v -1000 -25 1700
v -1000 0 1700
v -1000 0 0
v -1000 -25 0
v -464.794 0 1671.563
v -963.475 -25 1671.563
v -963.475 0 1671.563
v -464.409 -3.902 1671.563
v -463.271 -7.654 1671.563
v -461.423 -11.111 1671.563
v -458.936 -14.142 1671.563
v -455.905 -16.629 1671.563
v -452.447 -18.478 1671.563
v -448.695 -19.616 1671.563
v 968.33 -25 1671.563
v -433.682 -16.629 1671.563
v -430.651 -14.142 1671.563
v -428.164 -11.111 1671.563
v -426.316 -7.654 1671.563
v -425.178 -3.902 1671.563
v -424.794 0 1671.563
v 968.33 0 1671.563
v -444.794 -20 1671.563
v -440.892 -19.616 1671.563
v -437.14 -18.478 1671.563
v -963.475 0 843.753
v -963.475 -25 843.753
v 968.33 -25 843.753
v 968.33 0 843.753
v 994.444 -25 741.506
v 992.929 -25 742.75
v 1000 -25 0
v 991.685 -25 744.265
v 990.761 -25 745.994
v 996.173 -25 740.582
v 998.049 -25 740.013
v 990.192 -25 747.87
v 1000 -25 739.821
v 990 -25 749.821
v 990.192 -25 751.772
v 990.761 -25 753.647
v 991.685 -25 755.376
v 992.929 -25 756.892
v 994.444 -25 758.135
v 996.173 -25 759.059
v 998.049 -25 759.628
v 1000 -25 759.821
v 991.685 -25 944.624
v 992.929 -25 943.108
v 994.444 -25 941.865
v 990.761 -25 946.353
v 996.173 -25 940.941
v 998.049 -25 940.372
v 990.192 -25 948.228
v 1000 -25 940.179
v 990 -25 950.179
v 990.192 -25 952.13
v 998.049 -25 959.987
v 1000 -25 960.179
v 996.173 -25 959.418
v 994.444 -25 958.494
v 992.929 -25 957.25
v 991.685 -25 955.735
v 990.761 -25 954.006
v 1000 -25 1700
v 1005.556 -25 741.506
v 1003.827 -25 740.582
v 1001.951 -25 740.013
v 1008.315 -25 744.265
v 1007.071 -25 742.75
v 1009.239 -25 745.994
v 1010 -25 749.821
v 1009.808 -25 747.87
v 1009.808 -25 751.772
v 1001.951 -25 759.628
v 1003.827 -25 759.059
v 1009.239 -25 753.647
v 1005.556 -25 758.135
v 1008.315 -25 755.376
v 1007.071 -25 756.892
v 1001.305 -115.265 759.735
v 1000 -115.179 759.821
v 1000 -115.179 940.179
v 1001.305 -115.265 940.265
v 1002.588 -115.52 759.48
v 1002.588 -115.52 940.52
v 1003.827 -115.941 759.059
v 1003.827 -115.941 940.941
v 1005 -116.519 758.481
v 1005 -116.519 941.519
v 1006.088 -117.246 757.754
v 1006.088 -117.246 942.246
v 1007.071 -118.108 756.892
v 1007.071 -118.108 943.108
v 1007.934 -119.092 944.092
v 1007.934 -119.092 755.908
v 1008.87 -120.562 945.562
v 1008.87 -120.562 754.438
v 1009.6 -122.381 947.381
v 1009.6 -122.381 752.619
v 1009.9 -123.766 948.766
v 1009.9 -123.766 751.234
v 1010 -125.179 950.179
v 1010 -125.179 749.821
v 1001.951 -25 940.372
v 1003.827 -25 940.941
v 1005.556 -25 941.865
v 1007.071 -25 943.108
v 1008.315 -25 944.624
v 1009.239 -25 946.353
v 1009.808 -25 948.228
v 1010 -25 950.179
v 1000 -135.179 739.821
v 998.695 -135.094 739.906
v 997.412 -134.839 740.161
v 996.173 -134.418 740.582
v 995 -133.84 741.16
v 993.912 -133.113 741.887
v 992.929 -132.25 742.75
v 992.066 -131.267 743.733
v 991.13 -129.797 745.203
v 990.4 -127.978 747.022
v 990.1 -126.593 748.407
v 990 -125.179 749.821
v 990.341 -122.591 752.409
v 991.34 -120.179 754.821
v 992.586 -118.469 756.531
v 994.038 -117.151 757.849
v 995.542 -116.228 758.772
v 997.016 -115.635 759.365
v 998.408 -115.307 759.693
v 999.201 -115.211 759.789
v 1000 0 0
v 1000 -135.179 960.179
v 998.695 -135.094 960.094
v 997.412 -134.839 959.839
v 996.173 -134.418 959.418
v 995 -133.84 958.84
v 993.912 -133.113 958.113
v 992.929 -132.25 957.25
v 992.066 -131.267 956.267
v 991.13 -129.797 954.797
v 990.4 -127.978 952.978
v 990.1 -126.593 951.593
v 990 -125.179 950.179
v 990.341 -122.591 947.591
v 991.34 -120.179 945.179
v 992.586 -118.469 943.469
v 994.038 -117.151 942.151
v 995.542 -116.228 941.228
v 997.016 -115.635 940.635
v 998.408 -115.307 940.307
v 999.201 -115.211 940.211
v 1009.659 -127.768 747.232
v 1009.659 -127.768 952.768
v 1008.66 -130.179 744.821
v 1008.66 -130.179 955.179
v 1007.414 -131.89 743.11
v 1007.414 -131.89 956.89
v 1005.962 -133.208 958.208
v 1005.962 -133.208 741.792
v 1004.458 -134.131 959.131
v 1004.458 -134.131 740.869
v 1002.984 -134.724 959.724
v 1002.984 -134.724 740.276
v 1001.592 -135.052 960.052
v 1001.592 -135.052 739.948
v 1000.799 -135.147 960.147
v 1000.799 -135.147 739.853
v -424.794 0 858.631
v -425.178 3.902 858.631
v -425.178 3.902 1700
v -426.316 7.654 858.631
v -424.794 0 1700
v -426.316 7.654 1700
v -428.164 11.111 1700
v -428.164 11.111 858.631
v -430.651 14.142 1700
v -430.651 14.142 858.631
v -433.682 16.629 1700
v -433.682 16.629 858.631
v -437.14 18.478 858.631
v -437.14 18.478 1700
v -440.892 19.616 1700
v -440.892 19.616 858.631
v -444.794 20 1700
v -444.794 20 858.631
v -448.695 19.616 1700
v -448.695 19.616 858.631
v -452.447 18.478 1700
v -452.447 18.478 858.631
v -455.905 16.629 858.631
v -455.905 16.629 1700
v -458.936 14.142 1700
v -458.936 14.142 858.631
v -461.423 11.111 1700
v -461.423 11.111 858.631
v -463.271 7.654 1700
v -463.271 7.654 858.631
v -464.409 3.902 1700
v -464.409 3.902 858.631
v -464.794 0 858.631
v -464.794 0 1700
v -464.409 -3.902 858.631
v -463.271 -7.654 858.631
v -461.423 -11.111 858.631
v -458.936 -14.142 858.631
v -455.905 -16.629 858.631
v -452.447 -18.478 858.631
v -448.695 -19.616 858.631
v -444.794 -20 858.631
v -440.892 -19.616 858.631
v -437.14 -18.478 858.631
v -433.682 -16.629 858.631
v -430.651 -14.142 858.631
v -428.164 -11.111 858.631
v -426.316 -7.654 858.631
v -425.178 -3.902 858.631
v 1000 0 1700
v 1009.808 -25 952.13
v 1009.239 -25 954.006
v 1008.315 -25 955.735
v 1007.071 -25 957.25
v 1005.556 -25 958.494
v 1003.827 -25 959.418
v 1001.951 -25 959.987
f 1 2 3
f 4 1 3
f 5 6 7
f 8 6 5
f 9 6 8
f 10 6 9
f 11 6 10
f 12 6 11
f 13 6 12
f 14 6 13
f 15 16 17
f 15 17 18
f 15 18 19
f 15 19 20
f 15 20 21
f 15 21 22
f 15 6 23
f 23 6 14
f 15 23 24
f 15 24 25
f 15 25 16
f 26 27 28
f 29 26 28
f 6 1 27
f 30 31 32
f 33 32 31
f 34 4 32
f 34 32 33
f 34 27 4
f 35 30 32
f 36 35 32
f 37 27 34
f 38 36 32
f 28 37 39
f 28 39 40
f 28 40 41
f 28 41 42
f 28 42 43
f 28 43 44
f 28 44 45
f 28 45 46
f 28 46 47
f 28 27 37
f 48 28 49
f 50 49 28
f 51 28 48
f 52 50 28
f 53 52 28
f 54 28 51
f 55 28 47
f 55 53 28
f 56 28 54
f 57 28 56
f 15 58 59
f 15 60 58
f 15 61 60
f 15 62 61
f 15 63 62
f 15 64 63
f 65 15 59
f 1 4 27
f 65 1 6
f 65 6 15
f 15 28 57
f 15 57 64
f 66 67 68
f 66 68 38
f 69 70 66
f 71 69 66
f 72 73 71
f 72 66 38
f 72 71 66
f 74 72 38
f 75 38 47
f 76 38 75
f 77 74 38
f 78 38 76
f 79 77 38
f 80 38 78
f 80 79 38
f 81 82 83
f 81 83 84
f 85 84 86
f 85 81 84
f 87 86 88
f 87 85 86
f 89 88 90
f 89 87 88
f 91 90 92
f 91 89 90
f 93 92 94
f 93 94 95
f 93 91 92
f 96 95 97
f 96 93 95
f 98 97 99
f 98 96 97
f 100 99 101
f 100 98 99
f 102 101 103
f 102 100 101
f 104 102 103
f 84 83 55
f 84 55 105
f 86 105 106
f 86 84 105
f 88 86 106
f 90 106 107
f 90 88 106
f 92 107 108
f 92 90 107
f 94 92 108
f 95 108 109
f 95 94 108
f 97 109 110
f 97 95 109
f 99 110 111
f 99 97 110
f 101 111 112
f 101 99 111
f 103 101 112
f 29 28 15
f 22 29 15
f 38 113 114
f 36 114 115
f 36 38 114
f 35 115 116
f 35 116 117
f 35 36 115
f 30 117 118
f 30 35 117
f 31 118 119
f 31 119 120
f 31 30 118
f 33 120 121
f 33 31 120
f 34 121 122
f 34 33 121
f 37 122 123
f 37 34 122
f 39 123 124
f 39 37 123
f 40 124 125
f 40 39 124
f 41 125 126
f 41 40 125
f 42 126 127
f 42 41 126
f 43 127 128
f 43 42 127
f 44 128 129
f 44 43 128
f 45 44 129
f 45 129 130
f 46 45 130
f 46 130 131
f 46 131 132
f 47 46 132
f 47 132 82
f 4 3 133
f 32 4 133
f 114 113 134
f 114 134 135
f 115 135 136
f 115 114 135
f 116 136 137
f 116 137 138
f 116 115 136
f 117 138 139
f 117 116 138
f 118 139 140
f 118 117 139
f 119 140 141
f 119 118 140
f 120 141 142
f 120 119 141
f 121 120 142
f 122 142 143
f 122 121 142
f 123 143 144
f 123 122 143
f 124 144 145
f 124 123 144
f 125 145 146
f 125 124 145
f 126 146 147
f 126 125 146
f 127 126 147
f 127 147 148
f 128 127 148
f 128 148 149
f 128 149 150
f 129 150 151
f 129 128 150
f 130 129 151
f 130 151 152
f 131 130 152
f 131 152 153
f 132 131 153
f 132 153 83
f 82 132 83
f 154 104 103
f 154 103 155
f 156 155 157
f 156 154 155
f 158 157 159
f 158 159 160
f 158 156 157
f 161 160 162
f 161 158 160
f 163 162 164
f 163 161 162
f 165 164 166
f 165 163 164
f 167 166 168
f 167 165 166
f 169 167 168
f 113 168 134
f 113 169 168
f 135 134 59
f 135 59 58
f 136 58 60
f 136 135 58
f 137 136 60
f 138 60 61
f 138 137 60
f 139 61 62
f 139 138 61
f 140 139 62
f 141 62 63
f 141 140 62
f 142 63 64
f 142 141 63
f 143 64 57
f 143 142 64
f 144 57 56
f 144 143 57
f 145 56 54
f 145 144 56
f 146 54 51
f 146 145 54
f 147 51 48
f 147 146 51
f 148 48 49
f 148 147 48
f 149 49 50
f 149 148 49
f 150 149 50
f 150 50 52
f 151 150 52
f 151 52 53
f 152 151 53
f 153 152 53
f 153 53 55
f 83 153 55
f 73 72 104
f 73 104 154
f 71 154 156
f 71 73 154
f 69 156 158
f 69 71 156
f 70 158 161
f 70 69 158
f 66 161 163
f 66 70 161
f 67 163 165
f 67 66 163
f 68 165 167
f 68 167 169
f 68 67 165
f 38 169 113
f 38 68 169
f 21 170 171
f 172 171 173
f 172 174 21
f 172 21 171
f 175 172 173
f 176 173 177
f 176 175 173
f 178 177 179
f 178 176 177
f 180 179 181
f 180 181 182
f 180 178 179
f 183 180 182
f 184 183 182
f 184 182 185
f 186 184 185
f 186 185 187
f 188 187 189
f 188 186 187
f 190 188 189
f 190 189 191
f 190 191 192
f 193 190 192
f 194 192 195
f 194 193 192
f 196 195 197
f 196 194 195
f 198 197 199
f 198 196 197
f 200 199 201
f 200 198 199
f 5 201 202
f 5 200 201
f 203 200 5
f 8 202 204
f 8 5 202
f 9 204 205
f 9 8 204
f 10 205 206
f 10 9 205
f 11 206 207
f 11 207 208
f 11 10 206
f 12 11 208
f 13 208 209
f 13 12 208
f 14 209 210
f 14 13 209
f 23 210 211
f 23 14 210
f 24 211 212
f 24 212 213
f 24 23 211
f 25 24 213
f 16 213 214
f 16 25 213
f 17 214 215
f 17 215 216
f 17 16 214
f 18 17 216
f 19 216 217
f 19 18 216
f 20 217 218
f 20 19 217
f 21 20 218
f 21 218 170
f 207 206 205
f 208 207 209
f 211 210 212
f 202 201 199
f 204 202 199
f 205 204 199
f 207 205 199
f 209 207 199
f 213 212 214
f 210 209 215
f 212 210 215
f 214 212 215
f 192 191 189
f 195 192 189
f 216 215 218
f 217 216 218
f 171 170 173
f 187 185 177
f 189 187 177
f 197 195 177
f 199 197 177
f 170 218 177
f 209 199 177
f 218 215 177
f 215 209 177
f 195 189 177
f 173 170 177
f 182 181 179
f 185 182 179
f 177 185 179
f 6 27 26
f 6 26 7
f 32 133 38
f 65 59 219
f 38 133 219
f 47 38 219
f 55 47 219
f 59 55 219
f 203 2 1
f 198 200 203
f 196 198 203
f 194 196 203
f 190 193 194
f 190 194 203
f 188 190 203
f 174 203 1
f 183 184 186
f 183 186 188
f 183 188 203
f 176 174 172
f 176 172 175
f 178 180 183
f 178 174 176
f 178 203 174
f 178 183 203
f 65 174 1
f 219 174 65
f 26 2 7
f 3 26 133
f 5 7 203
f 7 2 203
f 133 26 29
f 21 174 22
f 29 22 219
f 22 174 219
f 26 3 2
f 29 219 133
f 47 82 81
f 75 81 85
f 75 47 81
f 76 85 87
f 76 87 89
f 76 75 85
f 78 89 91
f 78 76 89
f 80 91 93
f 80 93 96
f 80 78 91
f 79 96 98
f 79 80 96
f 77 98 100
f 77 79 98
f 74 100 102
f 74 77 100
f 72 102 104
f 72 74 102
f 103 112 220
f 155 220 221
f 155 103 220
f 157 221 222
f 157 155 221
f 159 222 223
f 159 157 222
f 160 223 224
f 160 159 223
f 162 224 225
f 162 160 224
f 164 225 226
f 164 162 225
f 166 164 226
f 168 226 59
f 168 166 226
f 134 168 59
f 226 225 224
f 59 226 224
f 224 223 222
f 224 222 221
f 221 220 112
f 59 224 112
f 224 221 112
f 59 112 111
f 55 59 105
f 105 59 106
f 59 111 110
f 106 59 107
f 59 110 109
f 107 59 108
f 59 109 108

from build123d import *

# Parameters (mm, degrees)
F1_DEPTH = 25
F5_W     = 1931.8042993546
F5_H     = 827.8105258942
F6_DEPTH = 25


with BuildPart() as f1:
    # F0 (on Front) → F1 (new body)
    with BuildSketch(Plane.XZ):
        Polygon((-1000, 0), (0, 0), (1000, 0), (1000, 1700), (0, 1700), (-1000, 1700), align=None)
    extrude(amount=F1_DEPTH)

    # F4: sweep along a path in F2
    with BuildLine(Plane.YZ.offset(1000)) as f4_path:
        Line((-25, 950), (-125, 950))
        Line((-125, 950), (-125, 750))
        Line((-125, 750), (-25, 750))
    # F3 (on face) → F4 (sweep)
    with BuildSketch(Plane.XZ.offset(25)):
        with BuildLine():
            ThreePointArc((1000, 940.1793980598), (1007.0710678119, 943.108330248), (1010, 950.1793980598))
            ThreePointArc((1010, 950.1793980598), (1007.0710678119, 957.2504658717), (1000, 960.1793980598))
            Line((1000, 960.1793980598), (1000, 940.1793980598))
        make_face()
        with BuildLine():
            Line((1000, 940.1793980598), (1000, 960.1793980598))
            ThreePointArc((1000, 960.1793980598), (990, 950.1793980598), (1000, 940.1793980598))
        make_face()
    sweep(path=f4_path.line, transition=Transition.RIGHT)

    # F5 (on face) → F6 (cut)
    with BuildSketch(Plane.XZ.offset(25)):
        with Locations((2.4275183678, 1257.6580047607)):
            Rectangle(F5_W, F5_H)
    extrude(amount=-F6_DEPTH, mode=Mode.SUBTRACT)

    # F9: sweep along a path in F7
    with BuildLine(Plane.XZ) as f9_path:
        Line((0, 847.6967215538), (0, 1689.0659332275))
    # F8 (on face) → F9 (sweep)
    with BuildSketch(Plane.XY.offset(1700)):
        with BuildLine():
            ThreePointArc((-464.7935223579, 0), (-444.7935223579, -20), (-424.7935223579, 0))
            Line((-424.7935223579, 0), (-464.7935223579, 0))
        make_face()
        with BuildLine():
            Line((-464.7935223579, 0), (-424.7935223579, 0))
            ThreePointArc((-424.7935223579, 0), (-444.7935223579, 20), (-464.7935223579, 0))
        make_face()
    sweep(path=f9_path.line)


solid = f1.part
